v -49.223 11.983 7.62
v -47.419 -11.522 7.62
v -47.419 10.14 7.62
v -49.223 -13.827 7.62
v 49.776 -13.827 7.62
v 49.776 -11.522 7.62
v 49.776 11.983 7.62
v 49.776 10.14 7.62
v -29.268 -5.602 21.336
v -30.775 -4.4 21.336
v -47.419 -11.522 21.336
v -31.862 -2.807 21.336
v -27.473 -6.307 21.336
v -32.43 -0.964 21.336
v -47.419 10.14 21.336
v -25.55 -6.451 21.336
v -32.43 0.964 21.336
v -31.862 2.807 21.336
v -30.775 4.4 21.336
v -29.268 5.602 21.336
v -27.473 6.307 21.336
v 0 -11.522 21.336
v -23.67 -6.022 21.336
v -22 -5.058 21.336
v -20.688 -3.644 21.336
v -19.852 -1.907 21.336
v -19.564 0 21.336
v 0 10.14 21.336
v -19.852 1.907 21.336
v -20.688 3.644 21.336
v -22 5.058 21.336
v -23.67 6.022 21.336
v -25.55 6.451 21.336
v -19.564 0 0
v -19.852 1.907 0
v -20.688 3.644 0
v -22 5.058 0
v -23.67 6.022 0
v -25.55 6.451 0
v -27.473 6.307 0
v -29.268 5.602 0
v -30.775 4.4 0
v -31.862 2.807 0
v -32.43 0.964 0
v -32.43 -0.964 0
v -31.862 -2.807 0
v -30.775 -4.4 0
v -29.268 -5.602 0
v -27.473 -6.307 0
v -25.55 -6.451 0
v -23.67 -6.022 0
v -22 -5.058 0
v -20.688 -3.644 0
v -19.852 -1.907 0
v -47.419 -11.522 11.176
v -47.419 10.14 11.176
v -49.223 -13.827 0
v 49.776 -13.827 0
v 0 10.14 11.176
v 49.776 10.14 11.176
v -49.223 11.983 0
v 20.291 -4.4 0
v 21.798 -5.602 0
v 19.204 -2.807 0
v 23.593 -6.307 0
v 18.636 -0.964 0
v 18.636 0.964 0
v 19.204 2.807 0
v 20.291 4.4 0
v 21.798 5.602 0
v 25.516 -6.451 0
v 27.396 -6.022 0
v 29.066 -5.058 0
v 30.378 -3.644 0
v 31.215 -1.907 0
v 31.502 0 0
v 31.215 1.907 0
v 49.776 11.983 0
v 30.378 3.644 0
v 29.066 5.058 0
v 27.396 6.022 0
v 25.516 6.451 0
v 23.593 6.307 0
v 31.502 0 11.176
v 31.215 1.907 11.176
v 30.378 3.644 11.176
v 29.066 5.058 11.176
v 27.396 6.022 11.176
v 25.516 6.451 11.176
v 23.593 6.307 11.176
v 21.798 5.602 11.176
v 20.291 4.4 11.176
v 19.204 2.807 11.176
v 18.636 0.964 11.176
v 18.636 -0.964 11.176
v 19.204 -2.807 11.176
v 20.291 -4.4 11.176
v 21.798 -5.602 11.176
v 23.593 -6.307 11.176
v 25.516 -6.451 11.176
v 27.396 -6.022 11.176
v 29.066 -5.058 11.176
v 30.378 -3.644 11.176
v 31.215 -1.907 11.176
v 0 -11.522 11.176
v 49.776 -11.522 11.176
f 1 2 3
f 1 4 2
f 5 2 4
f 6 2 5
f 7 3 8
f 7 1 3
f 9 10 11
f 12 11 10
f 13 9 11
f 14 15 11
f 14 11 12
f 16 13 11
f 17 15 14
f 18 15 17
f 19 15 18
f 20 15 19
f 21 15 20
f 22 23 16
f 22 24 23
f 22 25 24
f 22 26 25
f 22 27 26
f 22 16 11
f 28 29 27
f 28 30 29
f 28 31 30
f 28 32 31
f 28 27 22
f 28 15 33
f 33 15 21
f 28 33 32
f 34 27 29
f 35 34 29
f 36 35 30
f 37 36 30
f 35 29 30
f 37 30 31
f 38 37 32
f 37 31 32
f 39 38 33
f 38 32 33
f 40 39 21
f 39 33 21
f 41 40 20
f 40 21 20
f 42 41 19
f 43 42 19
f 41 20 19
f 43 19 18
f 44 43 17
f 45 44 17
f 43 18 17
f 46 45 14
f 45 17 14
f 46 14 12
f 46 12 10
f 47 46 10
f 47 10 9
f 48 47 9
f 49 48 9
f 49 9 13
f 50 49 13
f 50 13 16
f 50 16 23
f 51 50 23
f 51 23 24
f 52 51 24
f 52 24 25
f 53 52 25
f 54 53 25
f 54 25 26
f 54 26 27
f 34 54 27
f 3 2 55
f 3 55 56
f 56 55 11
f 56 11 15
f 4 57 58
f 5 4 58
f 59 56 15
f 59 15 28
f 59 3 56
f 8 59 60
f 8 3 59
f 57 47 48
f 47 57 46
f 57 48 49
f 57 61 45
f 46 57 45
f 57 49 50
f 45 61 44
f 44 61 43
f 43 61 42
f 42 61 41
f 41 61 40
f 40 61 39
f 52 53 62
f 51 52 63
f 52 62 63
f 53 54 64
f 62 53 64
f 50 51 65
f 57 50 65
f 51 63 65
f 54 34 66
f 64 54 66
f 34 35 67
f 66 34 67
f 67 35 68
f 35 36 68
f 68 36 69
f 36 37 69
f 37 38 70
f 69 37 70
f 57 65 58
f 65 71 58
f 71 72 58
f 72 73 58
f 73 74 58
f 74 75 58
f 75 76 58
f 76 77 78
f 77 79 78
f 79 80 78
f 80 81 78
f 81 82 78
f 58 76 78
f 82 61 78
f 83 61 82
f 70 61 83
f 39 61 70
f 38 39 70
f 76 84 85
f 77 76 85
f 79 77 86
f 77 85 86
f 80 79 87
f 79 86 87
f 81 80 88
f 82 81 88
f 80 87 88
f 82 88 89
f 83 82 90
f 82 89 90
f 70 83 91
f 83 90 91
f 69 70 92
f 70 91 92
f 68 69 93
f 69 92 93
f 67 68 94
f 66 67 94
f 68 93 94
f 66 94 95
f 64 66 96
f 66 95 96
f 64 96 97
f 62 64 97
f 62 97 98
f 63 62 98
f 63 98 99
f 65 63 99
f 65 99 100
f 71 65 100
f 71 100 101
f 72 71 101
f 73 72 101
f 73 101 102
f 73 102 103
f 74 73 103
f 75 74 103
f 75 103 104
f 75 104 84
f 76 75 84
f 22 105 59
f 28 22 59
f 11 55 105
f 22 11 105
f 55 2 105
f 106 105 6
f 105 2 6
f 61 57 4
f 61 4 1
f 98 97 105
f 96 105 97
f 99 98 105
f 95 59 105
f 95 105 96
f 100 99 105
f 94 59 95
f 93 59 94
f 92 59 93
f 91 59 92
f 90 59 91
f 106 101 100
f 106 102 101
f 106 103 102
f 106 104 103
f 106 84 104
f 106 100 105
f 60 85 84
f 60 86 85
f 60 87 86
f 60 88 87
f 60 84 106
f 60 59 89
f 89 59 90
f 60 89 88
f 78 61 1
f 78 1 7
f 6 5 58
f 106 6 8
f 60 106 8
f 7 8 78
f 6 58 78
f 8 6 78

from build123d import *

# Parameters (mm, degrees)
F0_W     = 98.998546
F0_H     = 25.809678
F1_DEPTH = 7.62
F2_W     = 97.194314
F2_H     = 21.661694
F3_DEPTH = 3.556
F4_W     = 47.418509
F4_H     = 21.661694
F5_DEPTH = 10.16
F6_R     = 6.469009
F6_R_2   = 6.469136
F7_DEPTH = 21.844


with BuildPart() as f1:
    # F0 (on Top) → F1 (new body)
    with BuildSketch(Plane.XY):
        with Locations((0.276532, -0.921774)):
            Rectangle(F0_W, F0_H)
    extrude(amount=F1_DEPTH)

    # F2 (on face) → F3 (join)
    with BuildSketch(Plane.XY.offset(7.62)):
        with Locations((1.178648, -0.691053)):
            Rectangle(F2_W, F2_H)
    extrude(amount=F3_DEPTH)

    # F4 (on face) → F5 (join)
    with BuildSketch(Plane.XY.offset(11.176)):
        with Locations((-23.709255, -0.691053)):
            Rectangle(F4_W, F4_H)
    extrude(amount=F5_DEPTH)

    # F6 (on face) → F7 (cut)
    with BuildSketch(Plane.XY.offset(21.336)):
        with Locations((-26.033347, 0)):
            Circle(F6_R)
        with Locations((25.032943, 0)):
            Circle(F6_R_2)
    extrude(amount=-F7_DEPTH, mode=Mode.SUBTRACT)


solid = f1.part
